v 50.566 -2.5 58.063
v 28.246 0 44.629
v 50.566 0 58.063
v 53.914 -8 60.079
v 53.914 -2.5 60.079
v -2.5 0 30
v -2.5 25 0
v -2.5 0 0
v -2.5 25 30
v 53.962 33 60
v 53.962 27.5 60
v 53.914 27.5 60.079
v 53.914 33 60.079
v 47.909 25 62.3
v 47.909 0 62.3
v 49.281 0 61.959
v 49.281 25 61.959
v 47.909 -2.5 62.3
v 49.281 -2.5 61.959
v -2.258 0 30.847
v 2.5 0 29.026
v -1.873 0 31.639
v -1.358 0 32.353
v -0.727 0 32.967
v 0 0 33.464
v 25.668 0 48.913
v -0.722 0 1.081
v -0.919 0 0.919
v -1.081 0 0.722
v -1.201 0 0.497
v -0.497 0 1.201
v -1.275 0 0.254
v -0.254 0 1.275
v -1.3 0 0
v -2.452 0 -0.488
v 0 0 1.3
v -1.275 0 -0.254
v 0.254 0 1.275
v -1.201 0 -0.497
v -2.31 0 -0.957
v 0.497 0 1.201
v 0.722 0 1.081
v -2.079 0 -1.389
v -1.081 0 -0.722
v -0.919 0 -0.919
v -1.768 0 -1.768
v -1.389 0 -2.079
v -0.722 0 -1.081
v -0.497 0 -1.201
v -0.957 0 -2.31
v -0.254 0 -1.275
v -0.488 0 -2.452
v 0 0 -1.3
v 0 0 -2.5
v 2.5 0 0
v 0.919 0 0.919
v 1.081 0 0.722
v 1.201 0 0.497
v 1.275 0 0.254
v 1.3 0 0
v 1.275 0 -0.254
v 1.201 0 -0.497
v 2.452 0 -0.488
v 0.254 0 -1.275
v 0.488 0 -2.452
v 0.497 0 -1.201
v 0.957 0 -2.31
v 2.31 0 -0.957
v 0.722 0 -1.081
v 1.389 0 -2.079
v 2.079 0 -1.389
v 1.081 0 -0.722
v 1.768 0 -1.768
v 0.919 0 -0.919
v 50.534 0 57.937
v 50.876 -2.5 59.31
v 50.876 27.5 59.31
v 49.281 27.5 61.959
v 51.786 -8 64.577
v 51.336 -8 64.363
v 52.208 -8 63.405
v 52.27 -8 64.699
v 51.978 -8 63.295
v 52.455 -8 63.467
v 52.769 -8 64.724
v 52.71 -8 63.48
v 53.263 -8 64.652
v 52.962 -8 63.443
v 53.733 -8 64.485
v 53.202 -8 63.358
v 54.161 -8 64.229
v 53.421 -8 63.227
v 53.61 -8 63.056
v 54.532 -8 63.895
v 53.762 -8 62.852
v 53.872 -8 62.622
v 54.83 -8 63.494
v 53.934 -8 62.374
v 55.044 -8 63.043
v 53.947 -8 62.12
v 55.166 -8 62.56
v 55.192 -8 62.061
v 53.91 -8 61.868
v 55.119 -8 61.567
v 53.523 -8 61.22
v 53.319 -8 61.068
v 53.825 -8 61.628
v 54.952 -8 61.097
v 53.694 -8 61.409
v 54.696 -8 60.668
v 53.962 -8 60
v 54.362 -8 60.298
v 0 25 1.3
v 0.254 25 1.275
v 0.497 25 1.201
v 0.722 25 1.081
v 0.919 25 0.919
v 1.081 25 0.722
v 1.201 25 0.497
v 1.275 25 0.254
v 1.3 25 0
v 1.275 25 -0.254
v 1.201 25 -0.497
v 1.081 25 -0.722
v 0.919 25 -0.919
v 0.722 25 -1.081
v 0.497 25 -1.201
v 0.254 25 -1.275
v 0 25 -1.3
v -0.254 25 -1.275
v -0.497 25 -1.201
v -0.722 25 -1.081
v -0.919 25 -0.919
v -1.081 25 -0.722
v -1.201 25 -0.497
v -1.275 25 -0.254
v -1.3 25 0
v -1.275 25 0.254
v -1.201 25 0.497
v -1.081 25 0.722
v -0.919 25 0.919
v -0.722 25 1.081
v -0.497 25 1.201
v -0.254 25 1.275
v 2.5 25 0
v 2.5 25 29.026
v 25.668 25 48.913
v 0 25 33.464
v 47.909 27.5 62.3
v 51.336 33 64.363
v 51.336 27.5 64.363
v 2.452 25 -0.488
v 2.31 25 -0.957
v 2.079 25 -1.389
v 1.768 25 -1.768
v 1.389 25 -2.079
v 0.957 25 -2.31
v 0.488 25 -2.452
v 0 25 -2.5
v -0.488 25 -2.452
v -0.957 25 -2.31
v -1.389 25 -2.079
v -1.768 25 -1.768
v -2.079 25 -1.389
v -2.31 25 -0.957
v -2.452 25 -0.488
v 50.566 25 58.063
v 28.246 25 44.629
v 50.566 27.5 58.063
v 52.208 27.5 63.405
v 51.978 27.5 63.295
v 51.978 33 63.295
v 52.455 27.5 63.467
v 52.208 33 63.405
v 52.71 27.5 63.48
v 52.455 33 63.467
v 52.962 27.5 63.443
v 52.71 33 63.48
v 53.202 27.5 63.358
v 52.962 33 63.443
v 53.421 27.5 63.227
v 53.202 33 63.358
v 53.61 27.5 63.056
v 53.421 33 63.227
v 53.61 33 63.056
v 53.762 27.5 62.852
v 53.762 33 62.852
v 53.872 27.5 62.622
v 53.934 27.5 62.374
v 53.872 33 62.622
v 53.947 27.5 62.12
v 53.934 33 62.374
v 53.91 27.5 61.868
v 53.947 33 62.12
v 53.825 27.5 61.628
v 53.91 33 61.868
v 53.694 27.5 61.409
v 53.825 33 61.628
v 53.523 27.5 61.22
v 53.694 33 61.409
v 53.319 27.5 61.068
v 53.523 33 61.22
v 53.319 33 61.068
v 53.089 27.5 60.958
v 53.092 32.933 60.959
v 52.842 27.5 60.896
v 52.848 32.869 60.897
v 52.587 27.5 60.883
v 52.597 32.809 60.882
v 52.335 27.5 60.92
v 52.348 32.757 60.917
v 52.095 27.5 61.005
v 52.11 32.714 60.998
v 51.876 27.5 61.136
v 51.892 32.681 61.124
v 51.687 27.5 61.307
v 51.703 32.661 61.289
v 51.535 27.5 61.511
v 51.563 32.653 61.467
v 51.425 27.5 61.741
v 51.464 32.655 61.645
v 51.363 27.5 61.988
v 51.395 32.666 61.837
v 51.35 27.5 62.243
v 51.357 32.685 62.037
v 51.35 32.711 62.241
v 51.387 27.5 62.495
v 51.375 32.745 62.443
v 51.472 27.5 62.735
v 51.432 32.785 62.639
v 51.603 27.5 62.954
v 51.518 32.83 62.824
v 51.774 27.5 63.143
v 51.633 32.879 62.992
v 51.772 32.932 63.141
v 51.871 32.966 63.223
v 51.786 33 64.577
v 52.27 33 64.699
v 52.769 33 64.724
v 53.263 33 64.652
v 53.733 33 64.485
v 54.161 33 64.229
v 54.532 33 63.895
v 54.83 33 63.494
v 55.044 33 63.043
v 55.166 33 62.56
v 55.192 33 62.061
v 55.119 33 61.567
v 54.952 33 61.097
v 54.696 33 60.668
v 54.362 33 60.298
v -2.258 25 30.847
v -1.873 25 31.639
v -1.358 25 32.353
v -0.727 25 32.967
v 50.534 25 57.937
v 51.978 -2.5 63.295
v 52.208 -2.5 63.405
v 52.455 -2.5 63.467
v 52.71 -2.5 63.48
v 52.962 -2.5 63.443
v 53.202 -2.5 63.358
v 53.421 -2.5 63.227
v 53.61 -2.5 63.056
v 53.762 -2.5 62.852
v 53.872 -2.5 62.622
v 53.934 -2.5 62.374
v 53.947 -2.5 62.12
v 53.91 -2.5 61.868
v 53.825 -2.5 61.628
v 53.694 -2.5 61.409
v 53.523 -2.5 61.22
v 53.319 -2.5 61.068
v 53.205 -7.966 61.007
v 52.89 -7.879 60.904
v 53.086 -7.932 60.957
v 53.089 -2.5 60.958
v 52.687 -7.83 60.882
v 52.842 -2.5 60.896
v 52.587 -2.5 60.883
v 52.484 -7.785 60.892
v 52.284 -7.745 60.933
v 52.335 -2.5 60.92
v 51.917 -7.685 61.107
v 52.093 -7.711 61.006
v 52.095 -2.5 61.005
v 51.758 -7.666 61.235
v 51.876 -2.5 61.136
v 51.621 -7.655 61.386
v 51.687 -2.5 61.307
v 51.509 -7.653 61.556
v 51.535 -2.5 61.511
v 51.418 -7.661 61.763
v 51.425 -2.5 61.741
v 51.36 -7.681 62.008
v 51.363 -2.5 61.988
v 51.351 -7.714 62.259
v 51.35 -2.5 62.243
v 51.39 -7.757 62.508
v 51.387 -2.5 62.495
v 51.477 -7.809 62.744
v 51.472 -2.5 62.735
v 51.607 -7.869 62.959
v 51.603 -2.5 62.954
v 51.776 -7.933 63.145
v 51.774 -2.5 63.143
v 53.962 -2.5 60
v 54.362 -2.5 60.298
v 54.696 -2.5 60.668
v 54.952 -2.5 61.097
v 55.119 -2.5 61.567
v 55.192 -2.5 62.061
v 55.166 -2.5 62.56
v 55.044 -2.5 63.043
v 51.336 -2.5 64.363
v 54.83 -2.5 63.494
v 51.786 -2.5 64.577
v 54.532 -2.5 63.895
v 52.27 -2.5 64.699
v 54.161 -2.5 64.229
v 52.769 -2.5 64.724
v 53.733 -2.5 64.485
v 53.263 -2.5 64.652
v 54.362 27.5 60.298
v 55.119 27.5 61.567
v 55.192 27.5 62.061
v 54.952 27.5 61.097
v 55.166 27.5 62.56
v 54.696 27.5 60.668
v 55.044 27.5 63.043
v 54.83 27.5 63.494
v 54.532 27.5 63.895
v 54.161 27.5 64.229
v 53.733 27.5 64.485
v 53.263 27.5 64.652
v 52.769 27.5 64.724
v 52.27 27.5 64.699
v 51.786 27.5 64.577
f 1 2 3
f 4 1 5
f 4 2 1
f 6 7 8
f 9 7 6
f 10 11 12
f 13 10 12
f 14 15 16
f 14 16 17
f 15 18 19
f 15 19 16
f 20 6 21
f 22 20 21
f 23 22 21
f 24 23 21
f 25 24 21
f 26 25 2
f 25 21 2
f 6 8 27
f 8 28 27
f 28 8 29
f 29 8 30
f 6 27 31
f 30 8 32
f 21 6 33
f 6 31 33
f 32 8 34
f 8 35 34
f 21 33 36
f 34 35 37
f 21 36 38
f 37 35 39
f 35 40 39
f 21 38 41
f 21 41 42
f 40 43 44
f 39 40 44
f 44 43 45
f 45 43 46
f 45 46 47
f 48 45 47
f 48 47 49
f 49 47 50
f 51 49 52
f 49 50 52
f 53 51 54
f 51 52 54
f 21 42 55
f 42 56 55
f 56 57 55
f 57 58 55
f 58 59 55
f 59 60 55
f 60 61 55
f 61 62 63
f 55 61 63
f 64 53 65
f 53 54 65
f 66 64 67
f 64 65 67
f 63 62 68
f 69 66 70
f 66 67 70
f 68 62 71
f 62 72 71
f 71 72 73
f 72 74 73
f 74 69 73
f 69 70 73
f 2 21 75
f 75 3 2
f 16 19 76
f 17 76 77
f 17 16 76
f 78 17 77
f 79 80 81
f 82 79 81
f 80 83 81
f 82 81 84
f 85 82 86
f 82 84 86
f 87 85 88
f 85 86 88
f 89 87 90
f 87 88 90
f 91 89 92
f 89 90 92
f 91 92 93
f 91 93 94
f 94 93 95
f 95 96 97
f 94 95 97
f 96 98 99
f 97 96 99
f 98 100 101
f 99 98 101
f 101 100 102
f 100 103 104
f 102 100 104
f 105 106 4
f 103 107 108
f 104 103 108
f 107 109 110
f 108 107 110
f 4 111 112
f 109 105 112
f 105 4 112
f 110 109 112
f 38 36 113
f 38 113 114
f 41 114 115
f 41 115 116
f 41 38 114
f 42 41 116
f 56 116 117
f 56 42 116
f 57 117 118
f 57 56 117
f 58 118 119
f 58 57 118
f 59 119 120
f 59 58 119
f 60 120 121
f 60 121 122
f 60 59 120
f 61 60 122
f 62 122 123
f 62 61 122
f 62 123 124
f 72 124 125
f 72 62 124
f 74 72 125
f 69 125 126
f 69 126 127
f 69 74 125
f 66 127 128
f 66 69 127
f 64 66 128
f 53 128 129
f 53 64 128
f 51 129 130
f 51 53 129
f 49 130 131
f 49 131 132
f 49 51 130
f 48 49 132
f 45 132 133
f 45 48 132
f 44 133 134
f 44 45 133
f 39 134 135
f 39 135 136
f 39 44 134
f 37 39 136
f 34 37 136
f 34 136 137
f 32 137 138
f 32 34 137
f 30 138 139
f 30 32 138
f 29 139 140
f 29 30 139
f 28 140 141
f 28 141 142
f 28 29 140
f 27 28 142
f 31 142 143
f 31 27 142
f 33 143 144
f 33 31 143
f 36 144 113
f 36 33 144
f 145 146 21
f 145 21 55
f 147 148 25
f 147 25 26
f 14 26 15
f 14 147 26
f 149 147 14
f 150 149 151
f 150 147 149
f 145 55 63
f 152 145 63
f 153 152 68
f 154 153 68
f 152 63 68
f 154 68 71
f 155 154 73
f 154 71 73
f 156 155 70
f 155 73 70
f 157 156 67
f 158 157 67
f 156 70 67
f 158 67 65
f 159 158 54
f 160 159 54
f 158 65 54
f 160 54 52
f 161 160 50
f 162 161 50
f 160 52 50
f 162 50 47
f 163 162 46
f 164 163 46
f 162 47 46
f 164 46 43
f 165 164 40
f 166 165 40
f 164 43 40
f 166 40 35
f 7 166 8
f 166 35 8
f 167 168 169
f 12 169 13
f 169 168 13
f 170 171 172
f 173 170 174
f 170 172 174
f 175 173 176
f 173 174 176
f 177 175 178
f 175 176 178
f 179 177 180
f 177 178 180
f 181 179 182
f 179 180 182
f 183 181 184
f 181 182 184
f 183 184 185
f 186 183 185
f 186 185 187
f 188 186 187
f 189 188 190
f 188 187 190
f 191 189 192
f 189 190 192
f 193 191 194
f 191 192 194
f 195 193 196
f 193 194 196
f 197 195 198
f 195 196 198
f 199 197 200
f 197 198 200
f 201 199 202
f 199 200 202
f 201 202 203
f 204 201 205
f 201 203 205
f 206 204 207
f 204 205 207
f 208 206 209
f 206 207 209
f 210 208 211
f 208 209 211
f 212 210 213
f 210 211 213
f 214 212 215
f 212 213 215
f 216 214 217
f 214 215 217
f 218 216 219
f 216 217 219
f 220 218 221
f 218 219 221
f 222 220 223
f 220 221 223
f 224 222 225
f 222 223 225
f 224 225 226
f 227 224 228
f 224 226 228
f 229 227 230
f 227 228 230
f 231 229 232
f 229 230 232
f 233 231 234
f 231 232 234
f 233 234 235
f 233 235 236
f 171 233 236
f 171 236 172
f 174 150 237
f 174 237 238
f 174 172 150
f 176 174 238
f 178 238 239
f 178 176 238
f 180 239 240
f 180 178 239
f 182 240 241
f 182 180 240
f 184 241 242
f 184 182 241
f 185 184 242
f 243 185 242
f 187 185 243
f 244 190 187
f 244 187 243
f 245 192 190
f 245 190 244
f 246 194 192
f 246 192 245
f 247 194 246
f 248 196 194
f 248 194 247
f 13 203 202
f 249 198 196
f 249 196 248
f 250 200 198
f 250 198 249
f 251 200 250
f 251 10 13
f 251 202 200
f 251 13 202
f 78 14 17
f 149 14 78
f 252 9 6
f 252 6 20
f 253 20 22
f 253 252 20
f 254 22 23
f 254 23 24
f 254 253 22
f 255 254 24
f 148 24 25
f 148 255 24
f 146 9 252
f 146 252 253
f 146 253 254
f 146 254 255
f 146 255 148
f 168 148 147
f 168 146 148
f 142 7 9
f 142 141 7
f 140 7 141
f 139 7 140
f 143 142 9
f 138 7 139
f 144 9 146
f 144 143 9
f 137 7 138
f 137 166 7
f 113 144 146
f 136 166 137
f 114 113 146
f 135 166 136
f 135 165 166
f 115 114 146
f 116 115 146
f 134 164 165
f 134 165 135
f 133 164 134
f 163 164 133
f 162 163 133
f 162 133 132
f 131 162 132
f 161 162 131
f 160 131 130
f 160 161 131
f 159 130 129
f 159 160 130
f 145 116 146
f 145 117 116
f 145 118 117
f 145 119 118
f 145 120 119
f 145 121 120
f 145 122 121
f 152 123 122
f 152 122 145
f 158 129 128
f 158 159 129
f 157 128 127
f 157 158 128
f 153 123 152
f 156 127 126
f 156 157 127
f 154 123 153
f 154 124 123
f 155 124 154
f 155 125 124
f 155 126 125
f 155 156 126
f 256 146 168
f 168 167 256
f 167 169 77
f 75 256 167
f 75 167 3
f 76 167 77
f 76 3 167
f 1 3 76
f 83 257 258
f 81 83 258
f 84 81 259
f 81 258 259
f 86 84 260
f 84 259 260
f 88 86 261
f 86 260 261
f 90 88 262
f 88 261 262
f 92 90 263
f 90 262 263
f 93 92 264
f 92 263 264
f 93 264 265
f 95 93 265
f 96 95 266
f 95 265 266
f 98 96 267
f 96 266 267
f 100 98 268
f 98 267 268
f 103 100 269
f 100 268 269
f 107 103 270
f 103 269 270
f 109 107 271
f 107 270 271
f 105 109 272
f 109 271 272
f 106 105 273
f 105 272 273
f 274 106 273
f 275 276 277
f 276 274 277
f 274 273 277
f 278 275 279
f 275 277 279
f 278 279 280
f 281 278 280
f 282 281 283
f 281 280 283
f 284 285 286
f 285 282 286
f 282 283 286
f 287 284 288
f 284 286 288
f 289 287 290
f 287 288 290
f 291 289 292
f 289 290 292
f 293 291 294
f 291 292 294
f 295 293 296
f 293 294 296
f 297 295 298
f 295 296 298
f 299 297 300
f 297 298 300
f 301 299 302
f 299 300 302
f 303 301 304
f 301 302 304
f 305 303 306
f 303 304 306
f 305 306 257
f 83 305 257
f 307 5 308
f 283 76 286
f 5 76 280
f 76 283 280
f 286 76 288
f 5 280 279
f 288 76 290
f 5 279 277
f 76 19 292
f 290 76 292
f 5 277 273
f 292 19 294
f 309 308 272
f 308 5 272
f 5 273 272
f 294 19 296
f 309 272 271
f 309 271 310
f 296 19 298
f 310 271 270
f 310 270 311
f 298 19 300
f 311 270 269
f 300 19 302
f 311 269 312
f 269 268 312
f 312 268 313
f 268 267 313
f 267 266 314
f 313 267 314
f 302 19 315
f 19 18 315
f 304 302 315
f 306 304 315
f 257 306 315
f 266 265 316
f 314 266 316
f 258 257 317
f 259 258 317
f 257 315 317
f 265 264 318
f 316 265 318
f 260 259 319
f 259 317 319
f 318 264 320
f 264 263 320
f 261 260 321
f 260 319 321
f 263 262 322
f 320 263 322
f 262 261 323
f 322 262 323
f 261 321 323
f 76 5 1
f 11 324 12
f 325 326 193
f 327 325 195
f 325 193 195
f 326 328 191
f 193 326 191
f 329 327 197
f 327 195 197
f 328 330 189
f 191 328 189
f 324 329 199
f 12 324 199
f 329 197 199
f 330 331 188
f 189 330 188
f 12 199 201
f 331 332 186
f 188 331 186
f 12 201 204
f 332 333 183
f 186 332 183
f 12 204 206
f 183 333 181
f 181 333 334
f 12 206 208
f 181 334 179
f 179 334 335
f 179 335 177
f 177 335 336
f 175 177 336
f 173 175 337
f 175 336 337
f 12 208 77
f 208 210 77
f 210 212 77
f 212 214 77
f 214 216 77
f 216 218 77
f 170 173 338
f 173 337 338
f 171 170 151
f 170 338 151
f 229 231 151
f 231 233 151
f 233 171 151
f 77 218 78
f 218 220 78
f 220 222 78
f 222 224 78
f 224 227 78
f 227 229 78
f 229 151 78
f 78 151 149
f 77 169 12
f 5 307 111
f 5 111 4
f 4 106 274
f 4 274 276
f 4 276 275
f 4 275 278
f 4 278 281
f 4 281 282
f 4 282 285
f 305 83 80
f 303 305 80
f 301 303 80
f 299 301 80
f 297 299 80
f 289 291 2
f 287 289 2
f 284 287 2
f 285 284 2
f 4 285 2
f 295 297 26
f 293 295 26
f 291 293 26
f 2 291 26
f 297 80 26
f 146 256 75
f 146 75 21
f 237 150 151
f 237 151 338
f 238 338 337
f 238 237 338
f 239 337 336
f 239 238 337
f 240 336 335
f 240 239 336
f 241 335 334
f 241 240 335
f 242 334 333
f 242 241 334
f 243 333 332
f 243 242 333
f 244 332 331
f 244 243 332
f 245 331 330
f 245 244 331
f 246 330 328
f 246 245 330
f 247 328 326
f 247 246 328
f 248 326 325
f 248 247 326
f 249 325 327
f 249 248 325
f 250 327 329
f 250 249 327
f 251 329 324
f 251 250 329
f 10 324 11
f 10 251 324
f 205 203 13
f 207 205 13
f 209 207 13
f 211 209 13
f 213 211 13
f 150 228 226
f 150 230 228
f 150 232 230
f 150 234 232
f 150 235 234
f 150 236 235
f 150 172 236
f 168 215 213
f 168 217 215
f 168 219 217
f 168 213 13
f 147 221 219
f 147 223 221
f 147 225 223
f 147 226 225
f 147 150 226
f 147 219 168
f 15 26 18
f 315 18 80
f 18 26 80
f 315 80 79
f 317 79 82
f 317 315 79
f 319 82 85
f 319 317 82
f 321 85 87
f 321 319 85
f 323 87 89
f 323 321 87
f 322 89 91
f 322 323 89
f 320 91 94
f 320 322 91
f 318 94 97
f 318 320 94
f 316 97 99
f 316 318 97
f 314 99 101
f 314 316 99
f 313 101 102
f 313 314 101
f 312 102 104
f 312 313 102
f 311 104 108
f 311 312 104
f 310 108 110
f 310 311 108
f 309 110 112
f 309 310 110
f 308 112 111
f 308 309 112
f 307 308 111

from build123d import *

# Parameters (mm, degrees)
SKETCH_1_R               = 2.5
SKETCH_1_R_2             = 1.3
EXTRUDE_1_DEPTH          = 25
EXTRUDE_2_DEPTH          = 25
EXTRUDE_3_DEPTH          = 8
EXTRUDE_3_DEPTH_BACK     = 33
EXTRUDE_4_DEPTH          = 5
SKETCH_4_R               = 1.3
CUT_EXTRUDE_1_DEPTH      = 92.24177093
CUT_EXTRUDE_1_DEPTH_BACK = 92.24177093
SKETCH_7_W               = 3
SKETCH_7_H               = 30
SKETCH_7_W_2             = 2.545959886
CUT_EXTRUDE_2_DEPTH      = 88.173473517
CUT_EXTRUDE_2_DEPTH_BACK = 9
CHAMFER_1_SIZE           = 1


with BuildPart() as part:
    # 草图1 → 凸台-拉伸1 (new body)
    with BuildSketch(Plane(origin=(0, 0, 0), x_dir=(1, 0, 0), z_dir=(0, 1, 0))):
        with Locations(Location((0, 0, 0), (0, 0, 270))):
            Circle(SKETCH_1_R)
        with Locations(Location((0, 0, 0), (0, 0, 270))):
            Circle(SKETCH_1_R_2, mode=Mode.SUBTRACT)
    extrude(amount=EXTRUDE_1_DEPTH)

    # 草图2 → 凸台-拉伸2 (add)
    with BuildSketch(Plane(origin=(0, 25, 0), x_dir=(1, 0, 0), z_dir=(0, 1, 0))):
        with BuildLine():
            ThreePointArc((2.5, 0), (0, -2.5), (-2.5, 0))
            Line((-2.5, 0), (-2.5, -30))
            ThreePointArc((-2.5, -30), (-1.63067791, -32.006781425), (0, -33.464101615))
            Line((0, -33.464101615), (51.335686519, -64.362639487))
            Line((51.335686519, -64.362639487), (53.961524227, -60))
            Line((53.961524227, -60), (2.5, -29.025721421))
            Line((2.5, -29.025721421), (2.5, 0))
        make_face()
    extrude(amount=-EXTRUDE_2_DEPTH)

    # 草图3 → 凸台-拉伸3 (add, two sides)
    with BuildSketch(Plane(origin=(0, 25, 0), x_dir=(1, 0, 0), z_dir=(0, 1, 0))) as extrude_3_sk:
        with BuildLine():
            Line((53.961524227, -60), (51.335686519, -64.362639487))
            ThreePointArc((51.335686519, -64.362639487), (54.829925117, -63.494238598), (53.961524227, -60))
        make_face()
    extrude(amount=EXTRUDE_3_DEPTH)
    extrude(extrude_3_sk.sketch, amount=-EXTRUDE_3_DEPTH_BACK)

    # 草图5 → 凸台-拉伸4 (add)
    with BuildSketch(Plane(origin=(-14.785406604, 0, 24.564883997), x_dir=(0.8567769491001666, 0, 0.5156871721214431), z_dir=(-0.5156871721214431, 0, 0.8567769491001666))):
        Polygon((77.174220423, 25), (77.174220423, 33), (47.215614176, 25), align=None)
    extrude_4 = extrude(amount=-EXTRUDE_4_DEPTH)

    # 镜向1: 凸台-拉伸4 across plane
    add(extrude_4.mirror(Plane(origin=(0, 12.5, 0), x_dir=(0, 0, 1), z_dir=(0, -1, 0))))

    # 草图4 → 切除-拉伸1 (cut, two sides)
    with BuildSketch(Plane(origin=(0, 25, 0), x_dir=(1, 0, 0), z_dir=(0, 1, 0))) as cut_extrude_1_sk:
        with Locations(Location((52.648605373, -62.181319744, 0), (0, 0, 238.956602405))):
            Circle(SKETCH_4_R)
    extrude(amount=CUT_EXTRUDE_1_DEPTH, mode=Mode.SUBTRACT)
    extrude(cut_extrude_1_sk.sketch, amount=-CUT_EXTRUDE_1_DEPTH_BACK, mode=Mode.SUBTRACT)

    # 草图7 → 切除-拉伸2 (cut, two sides)
    with BuildSketch(Plane(origin=(-14.785406604, 0, 24.564883997), x_dir=(0.8567769491001666, 0, 0.5156871721214431), z_dir=(-0.5156871721214431, 0, 0.8567769491001666))) as cut_extrude_2_sk:
        with Locations((75.674220423, 12.5)):
            Rectangle(SKETCH_7_W, SKETCH_7_H)
        with Locations((78.447200366, 12.5)):
            Rectangle(SKETCH_7_W_2, SKETCH_7_H)
    extrude(amount=CUT_EXTRUDE_2_DEPTH, mode=Mode.SUBTRACT)
    extrude(cut_extrude_2_sk.sketch, amount=-CUT_EXTRUDE_2_DEPTH_BACK, mode=Mode.SUBTRACT)

    # 倒角1
    chamfer_1_edges = [part.edges().sort_by_distance(p)[0] for p in [
        (48.765355672, 12.5, 62.815577971),
        (51.39119338, 12.5, 58.452938484),
    ]]
    chamfer(chamfer_1_edges, length=CHAMFER_1_SIZE)


solid = part.part
